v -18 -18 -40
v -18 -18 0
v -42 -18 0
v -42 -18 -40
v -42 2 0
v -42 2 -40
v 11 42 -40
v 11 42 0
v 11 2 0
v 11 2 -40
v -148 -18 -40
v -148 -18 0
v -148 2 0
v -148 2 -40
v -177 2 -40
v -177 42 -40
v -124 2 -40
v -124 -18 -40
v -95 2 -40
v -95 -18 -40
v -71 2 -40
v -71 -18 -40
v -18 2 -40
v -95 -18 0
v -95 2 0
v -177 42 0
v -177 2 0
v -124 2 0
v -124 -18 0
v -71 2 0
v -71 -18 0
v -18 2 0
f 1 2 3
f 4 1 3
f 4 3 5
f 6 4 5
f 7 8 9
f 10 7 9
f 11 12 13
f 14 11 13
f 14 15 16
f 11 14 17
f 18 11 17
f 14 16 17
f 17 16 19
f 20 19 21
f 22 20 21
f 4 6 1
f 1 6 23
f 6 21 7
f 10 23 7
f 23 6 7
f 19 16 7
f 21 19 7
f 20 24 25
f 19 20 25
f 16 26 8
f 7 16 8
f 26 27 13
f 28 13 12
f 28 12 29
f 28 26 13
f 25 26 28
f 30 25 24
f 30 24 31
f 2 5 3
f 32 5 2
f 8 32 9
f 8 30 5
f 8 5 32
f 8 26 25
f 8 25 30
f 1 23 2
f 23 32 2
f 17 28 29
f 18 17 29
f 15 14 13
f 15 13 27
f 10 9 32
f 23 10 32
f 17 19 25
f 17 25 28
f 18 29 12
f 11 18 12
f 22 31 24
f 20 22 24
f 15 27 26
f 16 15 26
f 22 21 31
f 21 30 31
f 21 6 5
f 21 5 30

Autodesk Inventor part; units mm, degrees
ref_plane "YZ Plane" through (0, 0, 0) normal (1, 0, 0) x (0, 1, 0)
ref_plane "XZ Plane" through (0, 0, 0) normal (0, 1, 0) x (-1, 0, 0)
ref_plane "XY Plane" through (0, 0, 0) normal (0, 0, 1) x (1, 0, 0)
sketch "Sketch1" plane through (0, 0, 0) normal (0, 0, 1) x (1, 0, 0)
  line L0 (-45, 0) -> (-45, -40) construction
  line L1 (-68, -840) -> (-68, 0) construction
  line L2 (-98, 0) -> (-98, -840) construction
  line L3 (-121, -40) -> (-121, 0) construction
  line L4 (-151, 0) -> (-151, -40) construction
  line L5 (-174, -840) -> (-174, 0) construction
  line L6 (-15, -40) -> (-15, 0) construction
  line L7 (8, 0) -> (8, -840) construction
  line L8 (11, 2) -> (-18, 2)
  line L9 (-18, 2) -> (-18, -18)
  line L10 (-18, -18) -> (-42, -18)
  line L11 (-42, -18) -> (-42, 2)
  line L12 (-42, 2) -> (-71, 2)
  line L13 (-71, 2) -> (-71, -18)
  line L14 (-71, -18) -> (-95, -18)
  line L15 (-95, -18) -> (-95, 2)
  line L16 (-95, 2) -> (-124, 2)
  line L17 (-124, 2) -> (-124, -18)
  line L18 (-124, -18) -> (-148, -18)
  line L19 (-148, -18) -> (-148, 2)
  line L20 (-148, 2) -> (-177, 2)
  line L21 (-177, 2) -> (-177, 42)
  line L22 (-177, 42) -> (11, 42)
  line L23 (11, 42) -> (11, 2)
  point P0 (0, 0)
  dimension "d0" = 60
  dimension "d1" = 40
  dimension "d2" = 2
  dimension "d3" = 3
  dimension "d4" = 3
  dimension "d5" = 3
  dimension "d6" = 3
  dimension "d7" = 3
  dimension "d8" = 3
  dimension "d9" = 3
  dimension "d10" = 3
extrude "Extrusion1" add sketch "Sketch1" against normal blind 40
properties part number "Separator" material "Wood"
